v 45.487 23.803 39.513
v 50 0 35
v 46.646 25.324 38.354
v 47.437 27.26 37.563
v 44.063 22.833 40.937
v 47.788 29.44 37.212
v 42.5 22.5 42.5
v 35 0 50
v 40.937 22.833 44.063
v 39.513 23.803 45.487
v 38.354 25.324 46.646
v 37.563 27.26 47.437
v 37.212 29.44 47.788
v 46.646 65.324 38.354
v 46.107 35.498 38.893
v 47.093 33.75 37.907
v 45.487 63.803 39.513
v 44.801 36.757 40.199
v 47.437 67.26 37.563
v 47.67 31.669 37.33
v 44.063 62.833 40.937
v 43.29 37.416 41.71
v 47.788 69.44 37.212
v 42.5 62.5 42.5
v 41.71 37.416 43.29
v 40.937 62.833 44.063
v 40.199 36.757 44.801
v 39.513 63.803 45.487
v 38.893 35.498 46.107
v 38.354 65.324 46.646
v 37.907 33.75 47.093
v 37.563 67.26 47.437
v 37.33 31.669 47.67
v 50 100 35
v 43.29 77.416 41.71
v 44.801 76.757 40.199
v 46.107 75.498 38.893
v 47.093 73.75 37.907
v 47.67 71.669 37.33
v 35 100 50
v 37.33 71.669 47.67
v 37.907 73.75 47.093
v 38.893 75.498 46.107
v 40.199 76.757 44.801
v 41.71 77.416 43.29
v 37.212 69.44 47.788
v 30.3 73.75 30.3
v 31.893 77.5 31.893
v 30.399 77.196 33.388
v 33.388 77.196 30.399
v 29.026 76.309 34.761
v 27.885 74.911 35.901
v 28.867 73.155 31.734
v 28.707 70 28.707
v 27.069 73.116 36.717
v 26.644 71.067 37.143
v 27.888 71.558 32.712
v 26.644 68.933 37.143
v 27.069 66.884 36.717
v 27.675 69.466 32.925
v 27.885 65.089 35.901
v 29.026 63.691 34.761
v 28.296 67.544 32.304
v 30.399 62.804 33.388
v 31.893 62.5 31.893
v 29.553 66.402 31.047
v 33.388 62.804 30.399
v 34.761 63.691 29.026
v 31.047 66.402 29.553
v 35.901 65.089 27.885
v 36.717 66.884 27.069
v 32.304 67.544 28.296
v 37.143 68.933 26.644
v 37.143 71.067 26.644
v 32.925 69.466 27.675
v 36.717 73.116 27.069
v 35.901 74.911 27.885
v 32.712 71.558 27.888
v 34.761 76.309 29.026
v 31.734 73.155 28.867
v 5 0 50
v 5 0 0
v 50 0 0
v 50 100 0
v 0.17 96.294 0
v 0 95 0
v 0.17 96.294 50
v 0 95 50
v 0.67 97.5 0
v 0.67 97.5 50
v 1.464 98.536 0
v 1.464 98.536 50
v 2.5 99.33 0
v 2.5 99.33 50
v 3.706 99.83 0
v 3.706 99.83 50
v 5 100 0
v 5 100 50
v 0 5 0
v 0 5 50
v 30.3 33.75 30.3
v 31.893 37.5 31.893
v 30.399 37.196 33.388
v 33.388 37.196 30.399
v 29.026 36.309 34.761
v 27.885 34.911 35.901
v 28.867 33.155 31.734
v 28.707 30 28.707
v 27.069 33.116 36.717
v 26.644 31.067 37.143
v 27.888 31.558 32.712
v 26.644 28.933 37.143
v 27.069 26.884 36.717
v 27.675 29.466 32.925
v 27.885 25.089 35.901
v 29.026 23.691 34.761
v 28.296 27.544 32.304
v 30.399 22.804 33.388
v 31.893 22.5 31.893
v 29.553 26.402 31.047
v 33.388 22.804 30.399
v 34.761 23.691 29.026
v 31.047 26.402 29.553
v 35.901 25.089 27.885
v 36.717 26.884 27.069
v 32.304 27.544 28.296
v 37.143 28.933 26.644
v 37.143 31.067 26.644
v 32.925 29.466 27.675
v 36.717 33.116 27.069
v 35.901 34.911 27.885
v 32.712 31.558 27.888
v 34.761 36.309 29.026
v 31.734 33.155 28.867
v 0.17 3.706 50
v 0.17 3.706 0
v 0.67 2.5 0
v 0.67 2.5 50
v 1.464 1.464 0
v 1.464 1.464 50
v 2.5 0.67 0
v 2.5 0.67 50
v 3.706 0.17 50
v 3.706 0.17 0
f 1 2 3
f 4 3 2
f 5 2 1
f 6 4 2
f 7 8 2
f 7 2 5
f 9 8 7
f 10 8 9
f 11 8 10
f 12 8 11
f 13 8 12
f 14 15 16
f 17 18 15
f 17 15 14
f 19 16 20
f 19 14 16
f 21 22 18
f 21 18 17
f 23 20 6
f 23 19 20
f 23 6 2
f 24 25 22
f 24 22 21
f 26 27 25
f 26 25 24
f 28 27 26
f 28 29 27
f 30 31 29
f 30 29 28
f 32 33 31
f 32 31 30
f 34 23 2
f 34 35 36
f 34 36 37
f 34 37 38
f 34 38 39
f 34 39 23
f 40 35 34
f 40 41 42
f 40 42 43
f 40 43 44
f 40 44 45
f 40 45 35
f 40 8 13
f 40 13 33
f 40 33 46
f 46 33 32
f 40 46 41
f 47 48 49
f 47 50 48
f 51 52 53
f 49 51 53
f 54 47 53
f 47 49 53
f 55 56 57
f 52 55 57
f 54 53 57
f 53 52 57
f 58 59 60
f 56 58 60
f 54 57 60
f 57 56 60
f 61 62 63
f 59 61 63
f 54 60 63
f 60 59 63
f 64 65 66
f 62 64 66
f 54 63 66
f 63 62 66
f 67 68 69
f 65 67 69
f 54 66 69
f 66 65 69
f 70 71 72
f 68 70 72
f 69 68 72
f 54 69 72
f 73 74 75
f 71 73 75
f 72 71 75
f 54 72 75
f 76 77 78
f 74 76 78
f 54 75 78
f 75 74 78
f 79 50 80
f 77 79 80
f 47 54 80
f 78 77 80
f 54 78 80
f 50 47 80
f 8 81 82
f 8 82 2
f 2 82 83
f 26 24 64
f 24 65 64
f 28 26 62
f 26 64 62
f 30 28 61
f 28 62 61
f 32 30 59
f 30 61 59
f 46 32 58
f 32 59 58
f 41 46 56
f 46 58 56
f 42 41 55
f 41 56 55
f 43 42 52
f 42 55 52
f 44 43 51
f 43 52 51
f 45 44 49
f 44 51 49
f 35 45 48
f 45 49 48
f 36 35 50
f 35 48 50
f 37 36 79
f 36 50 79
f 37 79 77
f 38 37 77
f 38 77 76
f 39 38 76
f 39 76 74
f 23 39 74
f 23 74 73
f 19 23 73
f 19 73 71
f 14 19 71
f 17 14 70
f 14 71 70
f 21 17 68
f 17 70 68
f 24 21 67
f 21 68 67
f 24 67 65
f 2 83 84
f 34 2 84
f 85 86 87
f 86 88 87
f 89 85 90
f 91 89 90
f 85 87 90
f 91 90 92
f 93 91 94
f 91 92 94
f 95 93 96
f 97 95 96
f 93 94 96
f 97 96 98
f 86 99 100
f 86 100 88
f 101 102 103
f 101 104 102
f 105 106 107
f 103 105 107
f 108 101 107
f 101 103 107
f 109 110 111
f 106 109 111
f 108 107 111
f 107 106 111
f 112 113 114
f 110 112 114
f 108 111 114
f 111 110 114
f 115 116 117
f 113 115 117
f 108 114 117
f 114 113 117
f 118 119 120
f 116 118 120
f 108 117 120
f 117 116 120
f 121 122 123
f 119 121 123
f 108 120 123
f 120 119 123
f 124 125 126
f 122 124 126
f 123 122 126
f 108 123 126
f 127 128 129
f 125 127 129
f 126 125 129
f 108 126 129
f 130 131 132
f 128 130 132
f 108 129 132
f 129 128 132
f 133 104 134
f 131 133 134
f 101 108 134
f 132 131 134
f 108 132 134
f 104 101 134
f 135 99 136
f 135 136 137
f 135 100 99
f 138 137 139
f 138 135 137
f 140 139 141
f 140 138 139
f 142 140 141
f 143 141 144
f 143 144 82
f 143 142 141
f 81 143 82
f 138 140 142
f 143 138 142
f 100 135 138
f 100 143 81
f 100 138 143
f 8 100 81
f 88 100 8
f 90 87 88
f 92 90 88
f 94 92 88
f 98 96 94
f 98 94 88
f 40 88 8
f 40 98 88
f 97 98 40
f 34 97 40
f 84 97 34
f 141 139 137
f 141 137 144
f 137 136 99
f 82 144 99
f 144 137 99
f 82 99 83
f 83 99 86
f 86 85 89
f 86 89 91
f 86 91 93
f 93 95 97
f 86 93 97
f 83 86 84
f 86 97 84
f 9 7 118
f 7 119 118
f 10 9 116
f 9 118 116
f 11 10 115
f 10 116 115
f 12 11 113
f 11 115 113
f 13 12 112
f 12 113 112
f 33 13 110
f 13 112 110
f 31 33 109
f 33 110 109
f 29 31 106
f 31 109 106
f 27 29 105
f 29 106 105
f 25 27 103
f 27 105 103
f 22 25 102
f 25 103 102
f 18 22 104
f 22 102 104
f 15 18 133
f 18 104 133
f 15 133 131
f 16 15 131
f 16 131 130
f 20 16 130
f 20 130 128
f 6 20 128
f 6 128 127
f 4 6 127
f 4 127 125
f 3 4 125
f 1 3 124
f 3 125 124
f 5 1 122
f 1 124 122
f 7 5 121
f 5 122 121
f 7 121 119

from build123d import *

# Parameters (mm, degrees)
F0_W     = 50
F0_H     = 100
F1_DEPTH = 50
F2_SIZE2 = 15
F2_SIZE  = 15
F4_D     = 15
F4_DEPTH = 15
F4_TIP   = 4.5064546427
F5_R     = 5
F6_R     = 5


with BuildPart() as f1:
    # F0 (on Top) → F1 (new body)
    with BuildSketch(Plane.XY):
        with Locations((25, 50)):
            Rectangle(F0_W, F0_H)
    extrude(amount=F1_DEPTH)

    # F2
    f2_edges = [f1.edges().sort_by_distance(p)[0] for p in [
        (50, 50, 50),
    ]]
    chamfer(f2_edges, length=F2_SIZE, length2=F2_SIZE2)

    # F4
    with Locations(Plane(origin=(42.5, 0, 42.5), x_dir=(0, 1, 0), z_dir=(0.7071067812, 0, 0.7071067812))):
        with Locations((30, 0), (70, 0)):
            Hole(F4_D / 2, depth=F4_DEPTH)
            with Locations((0, 0, -(F4_DEPTH + F4_TIP / 2))):  # 118° drill point
                Cone(0, F4_D / 2, F4_TIP, mode=Mode.SUBTRACT)

    # F5
    f5_edges = [f1.edges().sort_by_distance(p)[0] for p in [
        (0, 100, 25),
    ]]
    fillet(f5_edges, radius=F5_R)

    # F6
    f6_edges = [f1.edges().sort_by_distance(p)[0] for p in [
        (0, 0, 25),
    ]]
    fillet(f6_edges, radius=F6_R)


solid = f1.part
